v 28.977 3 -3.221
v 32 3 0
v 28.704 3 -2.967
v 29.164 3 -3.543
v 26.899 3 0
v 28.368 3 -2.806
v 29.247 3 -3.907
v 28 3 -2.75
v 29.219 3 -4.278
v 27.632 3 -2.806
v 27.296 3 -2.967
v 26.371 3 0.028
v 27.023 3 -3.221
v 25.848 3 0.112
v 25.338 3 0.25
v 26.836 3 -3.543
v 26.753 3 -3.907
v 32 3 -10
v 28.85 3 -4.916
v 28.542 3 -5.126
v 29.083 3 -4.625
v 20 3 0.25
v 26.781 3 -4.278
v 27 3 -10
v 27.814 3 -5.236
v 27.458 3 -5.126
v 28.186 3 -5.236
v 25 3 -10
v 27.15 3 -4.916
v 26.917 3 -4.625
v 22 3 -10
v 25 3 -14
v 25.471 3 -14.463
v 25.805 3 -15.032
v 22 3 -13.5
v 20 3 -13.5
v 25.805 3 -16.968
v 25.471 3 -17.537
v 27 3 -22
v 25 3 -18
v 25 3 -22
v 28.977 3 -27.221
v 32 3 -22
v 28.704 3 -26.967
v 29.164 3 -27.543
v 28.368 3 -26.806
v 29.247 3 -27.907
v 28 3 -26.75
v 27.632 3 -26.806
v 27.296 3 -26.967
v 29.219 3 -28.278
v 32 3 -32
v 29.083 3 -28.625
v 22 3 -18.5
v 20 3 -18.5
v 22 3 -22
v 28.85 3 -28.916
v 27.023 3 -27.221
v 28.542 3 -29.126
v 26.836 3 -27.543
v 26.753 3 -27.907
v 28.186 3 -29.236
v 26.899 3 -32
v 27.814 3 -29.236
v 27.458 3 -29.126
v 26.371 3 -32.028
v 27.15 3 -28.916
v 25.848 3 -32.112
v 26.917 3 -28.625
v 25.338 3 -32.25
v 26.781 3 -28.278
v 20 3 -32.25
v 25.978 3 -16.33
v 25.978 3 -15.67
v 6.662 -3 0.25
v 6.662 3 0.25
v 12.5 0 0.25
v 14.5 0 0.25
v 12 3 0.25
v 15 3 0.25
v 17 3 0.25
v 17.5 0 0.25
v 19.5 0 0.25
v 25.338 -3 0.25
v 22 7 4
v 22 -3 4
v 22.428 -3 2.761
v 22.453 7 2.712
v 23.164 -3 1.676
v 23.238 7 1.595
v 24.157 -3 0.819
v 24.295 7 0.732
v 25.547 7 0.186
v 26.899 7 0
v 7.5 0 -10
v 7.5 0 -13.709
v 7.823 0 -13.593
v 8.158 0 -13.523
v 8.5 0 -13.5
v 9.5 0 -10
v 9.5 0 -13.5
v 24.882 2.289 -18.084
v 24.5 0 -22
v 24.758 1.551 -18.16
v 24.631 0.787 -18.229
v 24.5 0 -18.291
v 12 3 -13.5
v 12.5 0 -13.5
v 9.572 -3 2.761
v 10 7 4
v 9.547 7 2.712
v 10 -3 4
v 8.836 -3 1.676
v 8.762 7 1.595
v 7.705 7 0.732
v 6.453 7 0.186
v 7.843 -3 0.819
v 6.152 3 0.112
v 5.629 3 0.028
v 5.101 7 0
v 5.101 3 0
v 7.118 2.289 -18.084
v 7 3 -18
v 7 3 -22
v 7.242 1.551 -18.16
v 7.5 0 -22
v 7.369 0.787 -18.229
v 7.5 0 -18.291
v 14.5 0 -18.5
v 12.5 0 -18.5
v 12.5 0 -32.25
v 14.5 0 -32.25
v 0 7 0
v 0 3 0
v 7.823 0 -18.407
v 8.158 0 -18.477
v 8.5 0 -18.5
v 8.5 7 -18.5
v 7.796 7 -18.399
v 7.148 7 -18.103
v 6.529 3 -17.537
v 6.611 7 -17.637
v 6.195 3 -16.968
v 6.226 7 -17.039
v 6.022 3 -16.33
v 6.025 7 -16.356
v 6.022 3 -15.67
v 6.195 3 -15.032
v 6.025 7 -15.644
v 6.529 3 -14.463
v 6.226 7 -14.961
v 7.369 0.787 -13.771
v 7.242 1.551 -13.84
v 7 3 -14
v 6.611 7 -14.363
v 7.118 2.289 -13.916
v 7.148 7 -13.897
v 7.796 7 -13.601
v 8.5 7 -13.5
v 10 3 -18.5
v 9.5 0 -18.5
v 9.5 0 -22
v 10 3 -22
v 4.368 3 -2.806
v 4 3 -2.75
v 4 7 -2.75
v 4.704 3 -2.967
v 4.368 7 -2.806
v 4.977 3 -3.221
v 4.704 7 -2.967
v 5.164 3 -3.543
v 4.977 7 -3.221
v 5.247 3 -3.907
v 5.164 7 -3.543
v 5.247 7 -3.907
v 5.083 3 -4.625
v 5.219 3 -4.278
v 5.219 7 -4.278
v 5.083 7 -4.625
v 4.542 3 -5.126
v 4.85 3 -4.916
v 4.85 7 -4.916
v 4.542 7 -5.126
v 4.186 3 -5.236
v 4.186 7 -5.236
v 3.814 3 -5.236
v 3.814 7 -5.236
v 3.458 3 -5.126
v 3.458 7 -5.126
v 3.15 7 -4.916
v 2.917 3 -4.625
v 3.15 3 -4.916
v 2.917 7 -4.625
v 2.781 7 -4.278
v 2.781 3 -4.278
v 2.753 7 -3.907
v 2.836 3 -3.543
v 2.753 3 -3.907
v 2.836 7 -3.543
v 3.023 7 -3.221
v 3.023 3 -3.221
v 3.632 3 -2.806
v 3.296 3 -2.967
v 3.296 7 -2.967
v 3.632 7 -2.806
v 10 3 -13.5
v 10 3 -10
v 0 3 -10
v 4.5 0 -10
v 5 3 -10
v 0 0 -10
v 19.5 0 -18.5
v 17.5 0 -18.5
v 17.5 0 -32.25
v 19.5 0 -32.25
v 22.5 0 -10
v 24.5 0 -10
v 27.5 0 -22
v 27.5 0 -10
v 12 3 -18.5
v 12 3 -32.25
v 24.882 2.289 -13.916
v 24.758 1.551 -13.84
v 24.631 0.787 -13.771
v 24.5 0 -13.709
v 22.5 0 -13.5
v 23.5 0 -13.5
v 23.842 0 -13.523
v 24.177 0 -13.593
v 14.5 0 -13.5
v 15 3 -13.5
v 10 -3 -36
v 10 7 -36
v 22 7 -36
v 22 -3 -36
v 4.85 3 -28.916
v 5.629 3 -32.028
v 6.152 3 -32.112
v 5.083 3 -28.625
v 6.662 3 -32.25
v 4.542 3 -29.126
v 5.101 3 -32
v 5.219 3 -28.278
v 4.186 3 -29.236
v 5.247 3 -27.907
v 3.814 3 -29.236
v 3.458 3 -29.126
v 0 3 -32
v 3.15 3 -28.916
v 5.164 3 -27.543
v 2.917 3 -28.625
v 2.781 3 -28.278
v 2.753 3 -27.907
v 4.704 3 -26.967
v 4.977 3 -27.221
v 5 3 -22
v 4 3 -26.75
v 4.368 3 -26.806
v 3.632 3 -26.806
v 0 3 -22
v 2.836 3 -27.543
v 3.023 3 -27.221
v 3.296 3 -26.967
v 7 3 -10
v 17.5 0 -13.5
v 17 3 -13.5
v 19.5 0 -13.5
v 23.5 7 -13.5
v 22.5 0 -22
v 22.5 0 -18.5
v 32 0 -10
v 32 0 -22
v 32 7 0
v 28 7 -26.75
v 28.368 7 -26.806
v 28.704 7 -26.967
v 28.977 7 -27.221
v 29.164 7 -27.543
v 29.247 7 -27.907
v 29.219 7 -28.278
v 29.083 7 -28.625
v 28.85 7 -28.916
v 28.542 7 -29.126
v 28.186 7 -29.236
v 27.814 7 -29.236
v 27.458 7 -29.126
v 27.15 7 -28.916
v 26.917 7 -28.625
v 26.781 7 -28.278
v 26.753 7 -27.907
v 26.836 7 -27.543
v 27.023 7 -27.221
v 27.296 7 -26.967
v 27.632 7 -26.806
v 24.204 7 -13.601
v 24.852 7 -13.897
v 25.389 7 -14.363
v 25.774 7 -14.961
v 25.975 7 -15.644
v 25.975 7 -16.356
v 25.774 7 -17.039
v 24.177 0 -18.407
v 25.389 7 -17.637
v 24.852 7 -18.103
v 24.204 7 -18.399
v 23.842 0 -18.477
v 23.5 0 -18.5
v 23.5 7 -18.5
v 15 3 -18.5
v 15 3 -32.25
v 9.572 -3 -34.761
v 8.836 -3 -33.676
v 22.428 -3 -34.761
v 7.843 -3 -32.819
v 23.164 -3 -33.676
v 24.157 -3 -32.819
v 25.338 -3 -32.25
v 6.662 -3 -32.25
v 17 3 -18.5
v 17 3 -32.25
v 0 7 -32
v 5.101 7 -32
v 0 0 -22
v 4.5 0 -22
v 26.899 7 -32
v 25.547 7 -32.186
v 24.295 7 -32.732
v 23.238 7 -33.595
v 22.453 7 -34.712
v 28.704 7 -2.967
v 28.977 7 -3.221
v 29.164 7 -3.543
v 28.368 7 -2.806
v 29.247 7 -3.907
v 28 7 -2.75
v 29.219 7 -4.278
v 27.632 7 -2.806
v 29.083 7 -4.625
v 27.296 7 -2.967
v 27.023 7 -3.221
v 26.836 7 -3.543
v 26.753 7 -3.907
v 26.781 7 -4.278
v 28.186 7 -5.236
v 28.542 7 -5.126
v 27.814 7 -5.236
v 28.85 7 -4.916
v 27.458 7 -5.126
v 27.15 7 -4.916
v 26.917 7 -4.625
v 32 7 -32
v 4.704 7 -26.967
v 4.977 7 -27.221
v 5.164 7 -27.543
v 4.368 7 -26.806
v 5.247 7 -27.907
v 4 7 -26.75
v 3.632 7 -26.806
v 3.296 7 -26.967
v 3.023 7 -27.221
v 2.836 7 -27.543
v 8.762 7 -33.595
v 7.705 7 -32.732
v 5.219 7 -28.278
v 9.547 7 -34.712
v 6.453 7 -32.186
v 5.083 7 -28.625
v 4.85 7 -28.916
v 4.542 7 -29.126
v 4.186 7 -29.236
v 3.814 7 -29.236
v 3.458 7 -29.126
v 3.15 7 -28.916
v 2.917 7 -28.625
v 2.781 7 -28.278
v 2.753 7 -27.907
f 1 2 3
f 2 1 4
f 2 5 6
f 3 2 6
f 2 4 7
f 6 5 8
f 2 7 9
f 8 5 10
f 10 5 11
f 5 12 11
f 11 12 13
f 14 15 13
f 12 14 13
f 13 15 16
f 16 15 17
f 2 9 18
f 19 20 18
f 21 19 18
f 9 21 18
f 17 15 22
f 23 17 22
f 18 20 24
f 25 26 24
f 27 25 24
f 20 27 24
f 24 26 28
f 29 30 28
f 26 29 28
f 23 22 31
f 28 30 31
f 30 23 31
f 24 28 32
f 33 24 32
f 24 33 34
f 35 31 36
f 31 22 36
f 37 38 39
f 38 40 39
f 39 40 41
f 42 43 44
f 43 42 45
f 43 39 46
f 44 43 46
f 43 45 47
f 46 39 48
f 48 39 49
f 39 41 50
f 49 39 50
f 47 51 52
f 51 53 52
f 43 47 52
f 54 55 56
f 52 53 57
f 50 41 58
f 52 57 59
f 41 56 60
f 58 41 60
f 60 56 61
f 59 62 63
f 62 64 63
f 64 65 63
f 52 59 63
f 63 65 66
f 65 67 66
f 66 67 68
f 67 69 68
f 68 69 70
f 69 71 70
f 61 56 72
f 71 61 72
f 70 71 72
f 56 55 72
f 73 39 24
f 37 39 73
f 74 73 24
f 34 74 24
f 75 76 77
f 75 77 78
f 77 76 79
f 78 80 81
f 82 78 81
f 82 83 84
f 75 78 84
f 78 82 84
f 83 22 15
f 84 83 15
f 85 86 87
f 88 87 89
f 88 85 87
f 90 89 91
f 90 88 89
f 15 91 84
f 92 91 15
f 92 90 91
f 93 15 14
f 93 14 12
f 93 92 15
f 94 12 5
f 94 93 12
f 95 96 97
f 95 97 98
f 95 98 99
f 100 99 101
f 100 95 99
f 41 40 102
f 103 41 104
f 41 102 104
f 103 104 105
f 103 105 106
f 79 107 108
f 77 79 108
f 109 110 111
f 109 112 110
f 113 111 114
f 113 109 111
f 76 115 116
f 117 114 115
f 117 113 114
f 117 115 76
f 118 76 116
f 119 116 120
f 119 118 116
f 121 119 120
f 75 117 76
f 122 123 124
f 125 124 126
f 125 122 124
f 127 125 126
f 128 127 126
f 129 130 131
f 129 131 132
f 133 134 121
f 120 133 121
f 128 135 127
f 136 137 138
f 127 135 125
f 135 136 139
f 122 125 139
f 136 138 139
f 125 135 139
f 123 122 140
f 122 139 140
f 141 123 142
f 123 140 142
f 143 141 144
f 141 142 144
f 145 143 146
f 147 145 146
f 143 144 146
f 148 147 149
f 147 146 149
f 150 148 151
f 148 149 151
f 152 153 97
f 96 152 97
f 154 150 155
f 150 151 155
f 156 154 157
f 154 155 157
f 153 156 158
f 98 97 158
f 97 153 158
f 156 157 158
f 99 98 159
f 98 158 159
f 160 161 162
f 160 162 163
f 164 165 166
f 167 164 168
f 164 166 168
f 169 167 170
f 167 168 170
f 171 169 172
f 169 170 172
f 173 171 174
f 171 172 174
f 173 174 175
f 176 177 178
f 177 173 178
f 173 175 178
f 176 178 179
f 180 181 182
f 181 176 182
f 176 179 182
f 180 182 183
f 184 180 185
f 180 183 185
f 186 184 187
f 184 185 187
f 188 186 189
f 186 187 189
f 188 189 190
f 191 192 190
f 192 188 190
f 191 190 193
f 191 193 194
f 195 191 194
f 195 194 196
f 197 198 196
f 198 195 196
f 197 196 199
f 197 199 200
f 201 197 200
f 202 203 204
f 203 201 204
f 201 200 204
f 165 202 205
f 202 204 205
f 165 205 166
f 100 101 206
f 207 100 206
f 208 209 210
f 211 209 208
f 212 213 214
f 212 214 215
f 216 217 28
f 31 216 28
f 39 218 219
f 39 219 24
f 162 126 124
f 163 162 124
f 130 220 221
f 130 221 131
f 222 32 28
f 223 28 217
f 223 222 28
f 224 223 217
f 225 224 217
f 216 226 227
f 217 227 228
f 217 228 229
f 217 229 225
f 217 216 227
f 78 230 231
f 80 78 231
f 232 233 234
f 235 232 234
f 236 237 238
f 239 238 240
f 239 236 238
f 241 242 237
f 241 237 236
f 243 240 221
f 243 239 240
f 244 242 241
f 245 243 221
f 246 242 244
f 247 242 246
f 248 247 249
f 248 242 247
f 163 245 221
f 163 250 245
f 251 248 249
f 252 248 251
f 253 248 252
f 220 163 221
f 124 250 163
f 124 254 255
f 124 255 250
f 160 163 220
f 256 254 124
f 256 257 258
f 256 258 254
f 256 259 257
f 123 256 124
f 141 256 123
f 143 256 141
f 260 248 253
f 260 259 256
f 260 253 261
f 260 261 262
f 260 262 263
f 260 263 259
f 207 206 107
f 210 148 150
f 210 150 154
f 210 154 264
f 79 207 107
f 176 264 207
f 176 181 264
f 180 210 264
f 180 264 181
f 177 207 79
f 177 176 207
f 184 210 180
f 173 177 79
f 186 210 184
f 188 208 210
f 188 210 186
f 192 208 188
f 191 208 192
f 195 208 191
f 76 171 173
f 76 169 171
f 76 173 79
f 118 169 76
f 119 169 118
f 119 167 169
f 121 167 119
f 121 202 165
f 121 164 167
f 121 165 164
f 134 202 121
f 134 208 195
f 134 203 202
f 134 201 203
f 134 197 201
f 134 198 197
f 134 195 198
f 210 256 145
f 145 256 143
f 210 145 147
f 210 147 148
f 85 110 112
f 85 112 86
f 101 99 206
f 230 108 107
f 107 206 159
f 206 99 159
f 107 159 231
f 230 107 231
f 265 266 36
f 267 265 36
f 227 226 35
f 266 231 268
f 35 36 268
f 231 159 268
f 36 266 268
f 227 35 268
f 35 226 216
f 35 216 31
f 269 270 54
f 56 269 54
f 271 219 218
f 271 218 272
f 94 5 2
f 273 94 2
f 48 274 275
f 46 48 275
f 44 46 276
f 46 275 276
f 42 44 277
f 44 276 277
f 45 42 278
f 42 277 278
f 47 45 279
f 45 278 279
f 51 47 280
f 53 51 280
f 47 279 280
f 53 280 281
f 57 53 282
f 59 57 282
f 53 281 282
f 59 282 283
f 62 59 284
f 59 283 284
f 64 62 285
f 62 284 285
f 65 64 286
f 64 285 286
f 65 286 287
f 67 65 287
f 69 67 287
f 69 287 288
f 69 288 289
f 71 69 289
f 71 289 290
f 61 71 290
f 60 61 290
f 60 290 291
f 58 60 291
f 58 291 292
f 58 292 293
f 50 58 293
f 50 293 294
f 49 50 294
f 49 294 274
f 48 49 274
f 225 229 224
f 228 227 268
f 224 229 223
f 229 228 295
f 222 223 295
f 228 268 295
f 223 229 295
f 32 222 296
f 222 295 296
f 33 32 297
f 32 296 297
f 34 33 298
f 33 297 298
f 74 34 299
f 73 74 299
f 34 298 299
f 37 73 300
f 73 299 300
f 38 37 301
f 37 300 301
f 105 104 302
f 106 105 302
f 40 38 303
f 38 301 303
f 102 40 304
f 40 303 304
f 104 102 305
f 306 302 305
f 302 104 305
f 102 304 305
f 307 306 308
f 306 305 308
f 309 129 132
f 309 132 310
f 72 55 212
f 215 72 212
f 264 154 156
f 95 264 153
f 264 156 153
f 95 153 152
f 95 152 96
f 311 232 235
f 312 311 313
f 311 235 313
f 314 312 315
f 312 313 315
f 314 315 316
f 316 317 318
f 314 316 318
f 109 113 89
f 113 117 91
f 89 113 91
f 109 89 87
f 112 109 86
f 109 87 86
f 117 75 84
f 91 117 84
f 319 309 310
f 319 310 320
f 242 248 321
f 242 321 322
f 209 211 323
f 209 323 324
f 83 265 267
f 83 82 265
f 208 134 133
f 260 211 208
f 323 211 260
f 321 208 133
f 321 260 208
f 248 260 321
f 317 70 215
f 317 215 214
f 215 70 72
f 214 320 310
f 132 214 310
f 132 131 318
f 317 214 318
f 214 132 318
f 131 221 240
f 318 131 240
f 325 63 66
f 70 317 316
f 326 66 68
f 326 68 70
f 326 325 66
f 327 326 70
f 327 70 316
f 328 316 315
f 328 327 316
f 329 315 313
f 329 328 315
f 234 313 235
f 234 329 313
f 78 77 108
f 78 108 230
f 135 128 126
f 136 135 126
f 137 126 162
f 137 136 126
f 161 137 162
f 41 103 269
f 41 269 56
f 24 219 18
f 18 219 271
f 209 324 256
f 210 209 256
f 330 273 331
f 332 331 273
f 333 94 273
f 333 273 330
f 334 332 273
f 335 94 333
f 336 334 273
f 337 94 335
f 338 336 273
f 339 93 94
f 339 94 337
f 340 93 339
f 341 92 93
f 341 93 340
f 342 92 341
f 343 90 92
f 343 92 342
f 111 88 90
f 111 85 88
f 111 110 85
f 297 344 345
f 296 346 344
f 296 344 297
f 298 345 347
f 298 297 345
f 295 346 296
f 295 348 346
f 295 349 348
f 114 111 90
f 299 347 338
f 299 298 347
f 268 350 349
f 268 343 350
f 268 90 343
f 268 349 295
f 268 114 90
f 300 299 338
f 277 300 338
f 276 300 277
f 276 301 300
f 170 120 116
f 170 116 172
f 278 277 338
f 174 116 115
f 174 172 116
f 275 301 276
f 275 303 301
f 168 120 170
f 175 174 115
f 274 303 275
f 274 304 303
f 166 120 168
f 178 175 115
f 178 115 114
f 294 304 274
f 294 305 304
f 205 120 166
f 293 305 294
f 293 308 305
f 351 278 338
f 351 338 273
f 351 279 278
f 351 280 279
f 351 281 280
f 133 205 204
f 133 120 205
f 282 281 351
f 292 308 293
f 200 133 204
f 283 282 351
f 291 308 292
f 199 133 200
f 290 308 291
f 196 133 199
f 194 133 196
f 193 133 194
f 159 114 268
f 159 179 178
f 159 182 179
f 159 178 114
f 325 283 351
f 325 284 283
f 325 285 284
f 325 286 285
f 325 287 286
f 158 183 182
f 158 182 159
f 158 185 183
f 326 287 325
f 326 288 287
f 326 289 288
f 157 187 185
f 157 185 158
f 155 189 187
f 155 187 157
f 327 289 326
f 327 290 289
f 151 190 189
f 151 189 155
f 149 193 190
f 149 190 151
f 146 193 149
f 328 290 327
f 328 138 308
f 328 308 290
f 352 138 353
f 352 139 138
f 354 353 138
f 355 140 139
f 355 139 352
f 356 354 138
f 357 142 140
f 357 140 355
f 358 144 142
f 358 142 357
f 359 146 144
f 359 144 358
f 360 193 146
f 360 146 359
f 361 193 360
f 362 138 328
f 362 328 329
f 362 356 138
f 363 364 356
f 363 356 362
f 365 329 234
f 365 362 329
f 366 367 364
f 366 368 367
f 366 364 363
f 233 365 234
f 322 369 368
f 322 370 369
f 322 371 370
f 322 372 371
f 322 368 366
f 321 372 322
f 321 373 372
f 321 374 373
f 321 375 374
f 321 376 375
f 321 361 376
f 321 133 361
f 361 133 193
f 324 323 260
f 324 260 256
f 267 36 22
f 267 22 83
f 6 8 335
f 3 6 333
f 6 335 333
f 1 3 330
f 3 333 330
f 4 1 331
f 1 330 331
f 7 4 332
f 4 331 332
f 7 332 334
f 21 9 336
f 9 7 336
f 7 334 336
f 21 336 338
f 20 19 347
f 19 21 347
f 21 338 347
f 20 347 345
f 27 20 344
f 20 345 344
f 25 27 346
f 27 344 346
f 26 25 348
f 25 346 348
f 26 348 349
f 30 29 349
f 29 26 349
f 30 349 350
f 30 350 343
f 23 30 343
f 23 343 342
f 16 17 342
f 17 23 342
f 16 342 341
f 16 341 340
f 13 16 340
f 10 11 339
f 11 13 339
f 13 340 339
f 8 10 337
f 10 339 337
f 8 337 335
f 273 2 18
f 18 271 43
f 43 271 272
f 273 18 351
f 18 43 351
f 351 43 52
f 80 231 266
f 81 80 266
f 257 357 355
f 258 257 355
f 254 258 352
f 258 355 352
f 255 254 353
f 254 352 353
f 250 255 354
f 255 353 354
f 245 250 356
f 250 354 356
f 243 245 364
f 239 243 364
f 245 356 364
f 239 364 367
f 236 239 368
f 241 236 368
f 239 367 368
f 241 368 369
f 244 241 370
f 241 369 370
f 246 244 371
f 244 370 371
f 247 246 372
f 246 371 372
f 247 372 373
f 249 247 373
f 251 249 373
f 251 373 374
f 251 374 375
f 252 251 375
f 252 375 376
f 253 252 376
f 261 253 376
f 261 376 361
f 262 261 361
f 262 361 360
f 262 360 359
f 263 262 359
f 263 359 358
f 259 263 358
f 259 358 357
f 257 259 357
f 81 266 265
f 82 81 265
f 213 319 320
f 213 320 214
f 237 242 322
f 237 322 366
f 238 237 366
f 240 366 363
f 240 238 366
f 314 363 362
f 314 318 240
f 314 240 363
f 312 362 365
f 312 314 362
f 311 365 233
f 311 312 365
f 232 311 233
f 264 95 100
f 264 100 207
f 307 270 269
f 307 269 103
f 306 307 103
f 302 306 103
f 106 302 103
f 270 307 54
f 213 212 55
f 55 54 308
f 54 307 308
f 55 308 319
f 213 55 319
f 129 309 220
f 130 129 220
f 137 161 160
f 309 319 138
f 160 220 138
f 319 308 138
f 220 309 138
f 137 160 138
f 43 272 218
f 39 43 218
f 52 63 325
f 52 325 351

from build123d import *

# Parameters (mm, degrees)
SKETCH_1_W                      = 32
SKETCH_1_H                      = 32
EXTRUDE_1_DEPTH                 = 7
SKETCH_3_R                      = 1.25
CUT_EXTRUDE_1_DEPTH             = 46.793012567
CUT_EXTRUDE_2_DEPTH             = 3
CUT_EXTRUDE_3_DEPTH             = 46.793012567
SKETCH_6_W                      = 12
SKETCH_6_H                      = 10
EXTRUDE_2_DEPTH                 = 4
SKETCH_11_W                     = 12
SKETCH_11_H                     = 3
CUT_EXTRUDE_5_DEPTH             = 0.25
SKETCH_12_W                     = 12
SKETCH_12_H                     = 3
CUT_EXTRUDE_6_DEPTH             = 0.25
CUT_EXTRUDE_7_REACH             = 40.38
CUT_EXTRUDE_7_DIRECTION_2_REACH = 40.38
FILLET_1_R                      = 5
FILLET_2_R                      = 5
CUT_EXTRUDE_8_REACH             = 50.672
SKETCH_13_W                     = 10
SKETCH_13_H                     = 3
CUT_EXTRUDE_9_REACH             = 50.672
SKETCH_14_W                     = 10
SKETCH_14_H                     = 3


with BuildPart() as part:
    # Эскиз1 → Бобышка-Вытянуть1 (new body)
    with BuildSketch(Plane(origin=(0, 0, 0), x_dir=(1, 0, 0), z_dir=(0, 1, 0))):
        with Locations((16, 16)):
            Rectangle(SKETCH_1_W, SKETCH_1_H)
    extrude(amount=EXTRUDE_1_DEPTH)

    # Эскиз3 → Вырез-Вытянуть1 (cut, through all)
    with BuildSketch(Plane(origin=(0, 7, 0), x_dir=(1, 0, 0), z_dir=(0, 1, 0))):
        with Locations(Location((4, 28, 0), (0, 0, 270))):
            Circle(SKETCH_3_R)
        with Locations(Location((28, 28, 0), (0, 0, 270))):
            Circle(SKETCH_3_R)
        with Locations(Location((4, 4, 0), (0, 0, 270))):
            Circle(SKETCH_3_R)
        with Locations(Location((28, 4, 0), (0, 0, 270))):
            Circle(SKETCH_3_R)
    extrude(amount=-CUT_EXTRUDE_1_DEPTH, mode=Mode.SUBTRACT)

    # Эскиз4 → Вырез-Вытянуть2 (cut)
    with BuildSketch(Plane.XZ):
        with BuildLine():
            Line((28, -10), (32, -10))
            Line((32, -10), (32, 0))
            Line((32, 0), (22, 0))
            Line((22, 0), (22, -4))
            ThreePointArc((22, -4), (23.757359313, -8.242640687), (28, -10))
        make_face()
        with BuildLine():
            Line((4, -10), (0, -10))
            Line((0, -10), (0, 0))
            Line((0, 0), (10, 0))
            Line((10, 0), (10, -4))
            ThreePointArc((10, -4), (8.242640687, -8.242640687), (4, -10))
        make_face()
        with BuildLine():
            Line((22, -32), (32, -32))
            Line((32, -32), (32, -22))
            Line((32, -22), (28, -22))
            ThreePointArc((28, -22), (23.757359313, -23.757359313), (22, -28))
            Line((22, -28), (22, -32))
        make_face()
        with BuildLine():
            Line((10, -32), (0, -32))
            Line((0, -32), (0, -22))
            Line((0, -22), (4, -22))
            ThreePointArc((4, -22), (8.242640687, -23.757359313), (10, -28))
            Line((10, -28), (10, -32))
        make_face()
    extrude(amount=-CUT_EXTRUDE_2_DEPTH, mode=Mode.SUBTRACT)

    # Эскиз5 → Вырез-Вытянуть3 (cut, through all)
    with BuildSketch(Plane(origin=(0, 7, 0), x_dir=(1, 0, 0), z_dir=(0, 1, 0))):
        with BuildLine():
            Line((23.5, 18.5), (8.5, 18.5))
            ThreePointArc((8.5, 18.5), (6, 16), (8.5, 13.5))
            Line((8.5, 13.5), (23.5, 13.5))
            ThreePointArc((23.5, 13.5), (26, 16), (23.5, 18.5))
        make_face()
    extrude(amount=-CUT_EXTRUDE_3_DEPTH, mode=Mode.SUBTRACT)

    # Эскиз6 → Бобышка-Вытянуть2 (add)
    with BuildSketch(Plane.XY):
        with Locations((16, 2)):
            Rectangle(SKETCH_6_W, SKETCH_6_H)
    extrude_2 = extrude(amount=EXTRUDE_2_DEPTH)

    # Зеркальное отражение1: Бобышка-Вытянуть2 across plane
    add(extrude_2.mirror(Plane(origin=(0, 0, -16), x_dir=(1, 0, 0), z_dir=(0, 0, -1))))

    # Эскиз11 → Вырез-Вытянуть5 (cut)
    with BuildSketch(Plane(origin=(0, 0, 0), x_dir=(-1, 0, 0), z_dir=(0, 0, -1))):
        with Locations((-16, -1.5)):
            Rectangle(SKETCH_11_W, SKETCH_11_H)
    extrude(amount=-CUT_EXTRUDE_5_DEPTH, mode=Mode.SUBTRACT)

    # Эскиз12 → Вырез-Вытянуть6 (cut)
    with BuildSketch(Plane.XY.offset(-32)):
        with Locations((16, -1.5)):
            Rectangle(SKETCH_12_W, SKETCH_12_H)
    extrude(amount=-CUT_EXTRUDE_6_DEPTH, mode=Mode.SUBTRACT)

    # Вырез-Вытянуть7: up to this face of the body (flat: up to its plane)
    cut_extrude_7_end = Plane(part.part.faces().sort_by_distance((16, -1.5, 0.25))[0])
    # Эскиз10 → Вырез-Вытянуть7 (cut, up to the picked face)
    with BuildSketch(Plane(origin=(0, 0, -16), x_dir=(-1, 0, 0), z_dir=(0, 0, -1)), mode=Mode.PRIVATE) as cut_extrude_7_sk1:
        Polygon((-14.5, 0), (-15, 3), (-17, 3), (-17.5, 0), align=None)
    cut_extrude_7_tool1 = split(extrude(cut_extrude_7_sk1.sketch, amount=-CUT_EXTRUDE_7_REACH, mode=Mode.PRIVATE), bisect_by=cut_extrude_7_end, keep=Keep.BOTH, mode=Mode.PRIVATE)
    # Эскиз10 → Вырез-Вытянуть7 (cut, up to the picked face)
    with BuildSketch(Plane(origin=(0, 0, -16), x_dir=(-1, 0, 0), z_dir=(0, 0, -1)), mode=Mode.PRIVATE) as cut_extrude_7_sk2:
        Polygon((-9.5, 0), (-10, 3), (-12, 3), (-12.5, 0), align=None)
    cut_extrude_7_tool2 = split(extrude(cut_extrude_7_sk2.sketch, amount=-CUT_EXTRUDE_7_REACH, mode=Mode.PRIVATE), bisect_by=cut_extrude_7_end, keep=Keep.BOTH, mode=Mode.PRIVATE)
    # Эскиз10 → Вырез-Вытянуть7 (cut, up to the picked face)
    with BuildSketch(Plane(origin=(0, 0, -16), x_dir=(-1, 0, 0), z_dir=(0, 0, -1)), mode=Mode.PRIVATE) as cut_extrude_7_sk3:
        Polygon((-4.5, 0), (-5, 3), (-7, 3), (-7.5, 0), align=None)
    cut_extrude_7_tool3 = split(extrude(cut_extrude_7_sk3.sketch, amount=-CUT_EXTRUDE_7_REACH, mode=Mode.PRIVATE), bisect_by=cut_extrude_7_end, keep=Keep.BOTH, mode=Mode.PRIVATE)
    # Эскиз10 → Вырез-Вытянуть7 (cut, up to the picked face)
    with BuildSketch(Plane(origin=(0, 0, -16), x_dir=(-1, 0, 0), z_dir=(0, 0, -1)), mode=Mode.PRIVATE) as cut_extrude_7_sk4:
        Polygon((-22.5, 0), (-22, 3), (-20, 3), (-19.5, 0), align=None)
    cut_extrude_7_tool4 = split(extrude(cut_extrude_7_sk4.sketch, amount=-CUT_EXTRUDE_7_REACH, mode=Mode.PRIVATE), bisect_by=cut_extrude_7_end, keep=Keep.BOTH, mode=Mode.PRIVATE)
    # Эскиз10 → Вырез-Вытянуть7 (cut, up to the picked face)
    with BuildSketch(Plane(origin=(0, 0, -16), x_dir=(-1, 0, 0), z_dir=(0, 0, -1)), mode=Mode.PRIVATE) as cut_extrude_7_sk5:
        Polygon((-27.5, 0), (-27, 3), (-25, 3), (-24.5, 0), align=None)
    cut_extrude_7_tool5 = split(extrude(cut_extrude_7_sk5.sketch, amount=-CUT_EXTRUDE_7_REACH, mode=Mode.PRIVATE), bisect_by=cut_extrude_7_end, keep=Keep.BOTH, mode=Mode.PRIVATE)
    add(cut_extrude_7_tool1.solids().sort_by(Axis((16, 1.4, -16), (0, 0, 1)))[0], mode=Mode.SUBTRACT)
    add(cut_extrude_7_tool2.solids().sort_by(Axis((11, 1.4, -16), (0, 0, 1)))[0], mode=Mode.SUBTRACT)
    add(cut_extrude_7_tool3.solids().sort_by(Axis((6, 1.4, -16), (0, 0, 1)))[0], mode=Mode.SUBTRACT)
    add(cut_extrude_7_tool4.solids().sort_by(Axis((21, 1.4, -16), (0, 0, 1)))[0], mode=Mode.SUBTRACT)
    add(cut_extrude_7_tool5.solids().sort_by(Axis((26, 1.4, -16), (0, 0, 1)))[0], mode=Mode.SUBTRACT)

    # Вырез-Вытянуть7 direction 2: up to this face of the body (flat: up to its plane)
    cut_extrude_7_direction_2_end = Plane(part.part.faces().sort_by_distance((16, -1.5, -32.25))[0])
    # Эскиз10 → Вырез-Вытянуть7 direction 2 (cut, up to the picked face)
    with BuildSketch(Plane(origin=(0, 0, -16), x_dir=(-1, 0, 0), z_dir=(0, 0, -1)), mode=Mode.PRIVATE) as cut_extrude_7_direction_2_sk1:
        Polygon((-14.5, 0), (-15, 3), (-17, 3), (-17.5, 0), align=None)
    cut_extrude_7_direction_2_tool1 = split(extrude(cut_extrude_7_direction_2_sk1.sketch, amount=CUT_EXTRUDE_7_DIRECTION_2_REACH, mode=Mode.PRIVATE), bisect_by=cut_extrude_7_direction_2_end, keep=Keep.BOTH, mode=Mode.PRIVATE)
    # Эскиз10 → Вырез-Вытянуть7 direction 2 (cut, up to the picked face)
    with BuildSketch(Plane(origin=(0, 0, -16), x_dir=(-1, 0, 0), z_dir=(0, 0, -1)), mode=Mode.PRIVATE) as cut_extrude_7_direction_2_sk2:
        Polygon((-9.5, 0), (-10, 3), (-12, 3), (-12.5, 0), align=None)
    cut_extrude_7_direction_2_tool2 = split(extrude(cut_extrude_7_direction_2_sk2.sketch, amount=CUT_EXTRUDE_7_DIRECTION_2_REACH, mode=Mode.PRIVATE), bisect_by=cut_extrude_7_direction_2_end, keep=Keep.BOTH, mode=Mode.PRIVATE)
    # Эскиз10 → Вырез-Вытянуть7 direction 2 (cut, up to the picked face)
    with BuildSketch(Plane(origin=(0, 0, -16), x_dir=(-1, 0, 0), z_dir=(0, 0, -1)), mode=Mode.PRIVATE) as cut_extrude_7_direction_2_sk3:
        Polygon((-4.5, 0), (-5, 3), (-7, 3), (-7.5, 0), align=None)
    cut_extrude_7_direction_2_tool3 = split(extrude(cut_extrude_7_direction_2_sk3.sketch, amount=CUT_EXTRUDE_7_DIRECTION_2_REACH, mode=Mode.PRIVATE), bisect_by=cut_extrude_7_direction_2_end, keep=Keep.BOTH, mode=Mode.PRIVATE)
    # Эскиз10 → Вырез-Вытянуть7 direction 2 (cut, up to the picked face)
    with BuildSketch(Plane(origin=(0, 0, -16), x_dir=(-1, 0, 0), z_dir=(0, 0, -1)), mode=Mode.PRIVATE) as cut_extrude_7_direction_2_sk4:
        Polygon((-22.5, 0), (-22, 3), (-20, 3), (-19.5, 0), align=None)
    cut_extrude_7_direction_2_tool4 = split(extrude(cut_extrude_7_direction_2_sk4.sketch, amount=CUT_EXTRUDE_7_DIRECTION_2_REACH, mode=Mode.PRIVATE), bisect_by=cut_extrude_7_direction_2_end, keep=Keep.BOTH, mode=Mode.PRIVATE)
    # Эскиз10 → Вырез-Вытянуть7 direction 2 (cut, up to the picked face)
    with BuildSketch(Plane(origin=(0, 0, -16), x_dir=(-1, 0, 0), z_dir=(0, 0, -1)), mode=Mode.PRIVATE) as cut_extrude_7_direction_2_sk5:
        Polygon((-27.5, 0), (-27, 3), (-25, 3), (-24.5, 0), align=None)
    cut_extrude_7_direction_2_tool5 = split(extrude(cut_extrude_7_direction_2_sk5.sketch, amount=CUT_EXTRUDE_7_DIRECTION_2_REACH, mode=Mode.PRIVATE), bisect_by=cut_extrude_7_direction_2_end, keep=Keep.BOTH, mode=Mode.PRIVATE)
    add(cut_extrude_7_direction_2_tool1.solids().sort_by(Axis((16, 1.4, -16), (0, 0, -1)))[0], mode=Mode.SUBTRACT)
    add(cut_extrude_7_direction_2_tool2.solids().sort_by(Axis((11, 1.4, -16), (0, 0, -1)))[0], mode=Mode.SUBTRACT)
    add(cut_extrude_7_direction_2_tool3.solids().sort_by(Axis((6, 1.4, -16), (0, 0, -1)))[0], mode=Mode.SUBTRACT)
    add(cut_extrude_7_direction_2_tool4.solids().sort_by(Axis((21, 1.4, -16), (0, 0, -1)))[0], mode=Mode.SUBTRACT)
    add(cut_extrude_7_direction_2_tool5.solids().sort_by(Axis((26, 1.4, -16), (0, 0, -1)))[0], mode=Mode.SUBTRACT)

    # Скругление1
    # the kernel refuses this fillet: 5 mm, written as the material it adds along each edge
    with BuildSketch(Plane(origin=(10, -9.247448714, 0), x_dir=(-1, 0, 0), z_dir=(0, 1, 0))) as fillet_1_piece_1_section:
        with BuildLine():
            CenterArc((4.898979486, 5), FILLET_1_R, 191.536959033, 78.463040967)
            Line((0, 4), (-0.09797959, 3.98))
            ThreePointArc((-0.09797959, 3.98), (-0.1, 2), (-0.1, 0))
            Line((-0.1, 0), (0, -0.1))
            Line((0, -0.1), (4.898979486, -0.1))
            Line((4.898979486, -0.1), (4.898979486, 0))
        make_face()
    fillet_1_piece_1 = extrude(amount=16.247448714, mode=Mode.PRIVATE)
    fillet_1_piece_1 = split(fillet_1_piece_1, bisect_by=Plane(origin=(9.174108799, 3, 1.317726135), z_dir=(0, -1, 0)), keep=Keep.TOP, mode=Mode.PRIVATE)
    fillet_1_piece_1 = split(fillet_1_piece_1, bisect_by=Plane(origin=(9.174108799, 0, 0.25), z_dir=(0, 0, 1)), keep=Keep.TOP, mode=Mode.PRIVATE)
    fillet_1_piece_1 = split(fillet_1_piece_1, bisect_by=Plane(origin=(9.174108799, -3, 1.317726135), z_dir=(0, 1, 0)), keep=Keep.TOP, mode=Mode.PRIVATE)
    add(fillet_1_piece_1)
    with BuildSketch(Plane(origin=(10, 3, 0), x_dir=(-1, 0, 0), z_dir=(0, 1, 0))) as fillet_1_piece_2_section:
        with BuildLine():
            CenterArc((4.898979486, 5), FILLET_1_R, 191.536959033, 78.463040967)
            Line((0, 4), (-0.09797959, 3.98))
            ThreePointArc((-0.09797959, 3.98), (-0.1, 2), (-0.1, 0))
            Line((-0.1, 0), (0, -0.1))
            Line((0, -0.1), (4.898979486, -0.1))
            Line((4.898979486, -0.1), (4.898979486, 0))
        make_face()
    fillet_1_piece_2 = extrude(amount=4, mode=Mode.PRIVATE)
    fillet_1_piece_2 = split(fillet_1_piece_2, bisect_by=Plane(origin=(7.929392112, 5, 0.25), z_dir=(0, 0, -1)), keep=Keep.TOP, mode=Mode.PRIVATE)
    add(fillet_1_piece_2)
    with BuildSketch(Plane(origin=(10, 3, 0), x_dir=(-1, 0, 0), z_dir=(0, 1, 0))) as fillet_1_piece_3_section:
        with BuildLine():
            CenterArc((4.898979486, 5), FILLET_1_R, 191.536959033, 78.463040967)
            Line((0, 4), (-0.09797959, 3.98))
            ThreePointArc((-0.09797959, 3.98), (-0.1, 2), (-0.1, 0))
            Line((-0.1, 0), (0, -0.1))
            Line((0, -0.1), (4.898979486, -0.1))
            Line((4.898979486, -0.1), (4.898979486, 0))
        make_face()
    fillet_1_piece_3 = extrude(amount=4, mode=Mode.PRIVATE)
    fillet_1_piece_3 = split(fillet_1_piece_3, bisect_by=Plane(origin=(9.174108799, 5, 0.25), z_dir=(0, 0, 1)), keep=Keep.TOP, mode=Mode.PRIVATE)
    add(fillet_1_piece_3)

    # Скругление2
    # the kernel refuses this fillet: 5 mm, written as the material it adds along each edge
    with BuildSketch(Plane(origin=(10, -9.247448714, -32), x_dir=(-1.5738521597081158e-12, 0, -1.0), z_dir=(0, 1, 0))) as fillet_2_piece_1_section:
        with BuildLine():
            CenterArc((5, 4.898979486), FILLET_2_R, 180, 78.463040967)
            Line((0, 4.898979486), (-0.1, 4.898979486))
            Line((-0.1, 4.898979486), (-0.1, 0))
            Line((-0.1, 0), (0, -0.1))
            ThreePointArc((0, -0.1), (2, -0.1), (3.98, -0.09797959))
            Line((3.98, -0.09797959), (4, 0))
        make_face()
    fillet_2_piece_1 = extrude(amount=16.247448714, mode=Mode.PRIVATE)
    fillet_2_piece_1 = split(fillet_2_piece_1, bisect_by=Plane(origin=(9.174108799, 0, -32.25), z_dir=(0, 0, -1)), keep=Keep.TOP, mode=Mode.PRIVATE)
    fillet_2_piece_1 = split(fillet_2_piece_1, bisect_by=Plane(origin=(9.174108799, 3, -33.317726135), z_dir=(0, -1, 0)), keep=Keep.TOP, mode=Mode.PRIVATE)
    fillet_2_piece_1 = split(fillet_2_piece_1, bisect_by=Plane(origin=(9.174108799, -3, -33.317726135), z_dir=(0, 1, 0)), keep=Keep.TOP, mode=Mode.PRIVATE)
    add(fillet_2_piece_1)
    with BuildSketch(Plane(origin=(10, 3, -32), x_dir=(-1.5720758028687162e-12, 0, -1.0), z_dir=(0, 1, 0))) as fillet_2_piece_2_section:
        with BuildLine():
            CenterArc((5, 4.898979486), FILLET_2_R, 180, 78.463040967)
            Line((0, 4.898979486), (-0.1, 4.898979486))
            Line((-0.1, 4.898979486), (-0.1, 0))
            Line((-0.1, 0), (0, -0.1))
            ThreePointArc((0, -0.1), (2, -0.1), (3.98, -0.09797959))
            Line((3.98, -0.09797959), (4, 0))
        make_face()
    fillet_2_piece_2 = extrude(amount=4, mode=Mode.PRIVATE)
    fillet_2_piece_2 = split(fillet_2_piece_2, bisect_by=Plane(origin=(9.174108799, 5, -32.25), z_dir=(0, 0, -1)), keep=Keep.TOP, mode=Mode.PRIVATE)
    add(fillet_2_piece_2)
    with BuildSketch(Plane(origin=(10, 3, -32), x_dir=(-1.5720758028687162e-12, 0, -1.0), z_dir=(0, 1, 0))) as fillet_2_piece_3_section:
        with BuildLine():
            CenterArc((5, 4.898979486), FILLET_2_R, 180, 78.463040967)
            Line((0, 4.898979486), (-0.1, 4.898979486))
            Line((-0.1, 4.898979486), (-0.1, 0))
            Line((-0.1, 0), (0, -0.1))
            ThreePointArc((0, -0.1), (2, -0.1), (3.98, -0.09797959))
            Line((3.98, -0.09797959), (4, 0))
        make_face()
    fillet_2_piece_3 = extrude(amount=4, mode=Mode.PRIVATE)
    fillet_2_piece_3 = split(fillet_2_piece_3, bisect_by=Plane(origin=(7.929392112, 5, -32.25), z_dir=(0, 0, 1)), keep=Keep.TOP, mode=Mode.PRIVATE)
    add(fillet_2_piece_3)
    with BuildSketch(Plane(origin=(22, 7, -32), x_dir=(1, 0, 0), z_dir=(0, -1, 0))) as fillet_2_piece_4_section:
        with BuildLine():
            CenterArc((4.898979486, -5), FILLET_2_R, 90, 78.463040967)
            Line((0, -4), (-0.09797959, -3.98))
            ThreePointArc((-0.09797959, -3.98), (-0.1, -2), (-0.1, 0))
            Line((-0.1, 0), (0, 0.1))
            Line((0, 0.1), (4.898979486, 0.1))
            Line((4.898979486, 0.1), (4.898979486, 0))
        make_face()
    fillet_2_piece_4 = extrude(amount=4, mode=Mode.PRIVATE)
    fillet_2_piece_4 = split(fillet_2_piece_4, bisect_by=Plane(origin=(24.070607888, 5, -32.25), z_dir=(0, 0, 1)), keep=Keep.TOP, mode=Mode.PRIVATE)
    add(fillet_2_piece_4)
    with BuildSketch(Plane(origin=(22, 7, -32), x_dir=(1, 0, 0), z_dir=(0, -1, 0))) as fillet_2_piece_5_section:
        with BuildLine():
            CenterArc((4.898979486, -5), FILLET_2_R, 90, 78.463040967)
            Line((0, -4), (-0.09797959, -3.98))
            ThreePointArc((-0.09797959, -3.98), (-0.1, -2), (-0.1, 0))
            Line((-0.1, 0), (0, 0.1))
            Line((0, 0.1), (4.898979486, 0.1))
            Line((4.898979486, 0.1), (4.898979486, 0))
        make_face()
    fillet_2_piece_5 = extrude(amount=4, mode=Mode.PRIVATE)
    fillet_2_piece_5 = split(fillet_2_piece_5, bisect_by=Plane(origin=(22.825891201, 5, -32.25), z_dir=(0, 0, -1)), keep=Keep.TOP, mode=Mode.PRIVATE)
    add(fillet_2_piece_5)
    with BuildSketch(Plane(origin=(22, 7, -32), x_dir=(1, 0, 0), z_dir=(0, -1, 0))) as fillet_2_piece_6_section:
        with BuildLine():
            CenterArc((4.898979486, -5), FILLET_2_R, 90, 78.463040967)
            Line((0, -4), (-0.09797959, -3.98))
            ThreePointArc((-0.09797959, -3.98), (-0.1, -2), (-0.1, 0))
            Line((-0.1, 0), (0, 0.1))
            Line((0, 0.1), (4.898979486, 0.1))
            Line((4.898979486, 0.1), (4.898979486, 0))
        make_face()
    fillet_2_piece_6 = extrude(amount=16.247448714, mode=Mode.PRIVATE)
    fillet_2_piece_6 = split(fillet_2_piece_6, bisect_by=Plane(origin=(22.825891201, 3, -33.317726135), z_dir=(0, -1, 0)), keep=Keep.TOP, mode=Mode.PRIVATE)
    fillet_2_piece_6 = split(fillet_2_piece_6, bisect_by=Plane(origin=(22.825891201, -3, -33.317726135), z_dir=(0, 1, 0)), keep=Keep.TOP, mode=Mode.PRIVATE)
    fillet_2_piece_6 = split(fillet_2_piece_6, bisect_by=Plane(origin=(22.825891201, 0, -32.25), z_dir=(0, 0, -1)), keep=Keep.TOP, mode=Mode.PRIVATE)
    add(fillet_2_piece_6)
    with BuildSketch(Plane(origin=(22, 7, 0), x_dir=(1.572075802868717e-12, 0, 1.0), z_dir=(0, -1, 0))) as fillet_2_piece_7_section:
        with BuildLine():
            CenterArc((5, -4.898979486), FILLET_2_R, 101.536959033, 78.463040967)
            Line((0, -4.898979486), (-0.1, -4.898979486))
            Line((-0.1, -4.898979486), (-0.1, 0))
            Line((-0.1, 0), (0, 0.1))
            ThreePointArc((0, 0.1), (2, 0.1), (3.98, 0.09797959))
            Line((3.98, 0.09797959), (4, 0))
        make_face()
    fillet_2_piece_7 = extrude(amount=4, mode=Mode.PRIVATE)
    fillet_2_piece_7 = split(fillet_2_piece_7, bisect_by=Plane(origin=(22.825891201, 5, 0.25), z_dir=(0, 0, 1)), keep=Keep.TOP, mode=Mode.PRIVATE)
    add(fillet_2_piece_7)
    with BuildSketch(Plane(origin=(22, 7, 0), x_dir=(1.572075802868717e-12, 0, 1.0), z_dir=(0, -1, 0))) as fillet_2_piece_8_section:
        with BuildLine():
            CenterArc((5, -4.898979486), FILLET_2_R, 101.536959033, 78.463040967)
            Line((0, -4.898979486), (-0.1, -4.898979486))
            Line((-0.1, -4.898979486), (-0.1, 0))
            Line((-0.1, 0), (0, 0.1))
            ThreePointArc((0, 0.1), (2, 0.1), (3.98, 0.09797959))
            Line((3.98, 0.09797959), (4, 0))
        make_face()
    fillet_2_piece_8 = extrude(amount=4, mode=Mode.PRIVATE)
    fillet_2_piece_8 = split(fillet_2_piece_8, bisect_by=Plane(origin=(24.070607888, 5, 0.25), z_dir=(0, 0, -1)), keep=Keep.TOP, mode=Mode.PRIVATE)
    add(fillet_2_piece_8)
    with BuildSketch(Plane(origin=(22, 7, 0), x_dir=(1.572075802868717e-12, 0, 1.0), z_dir=(0, -1, 0))) as fillet_2_piece_9_section:
        with BuildLine():
            CenterArc((5, -4.898979486), FILLET_2_R, 101.536959033, 78.463040967)
            Line((0, -4.898979486), (-0.1, -4.898979486))
            Line((-0.1, -4.898979486), (-0.1, 0))
            Line((-0.1, 0), (0, 0.1))
            ThreePointArc((0, 0.1), (2, 0.1), (3.98, 0.09797959))
            Line((3.98, 0.09797959), (4, 0))
        make_face()
    fillet_2_piece_9 = extrude(amount=16.247448714, mode=Mode.PRIVATE)
    fillet_2_piece_9 = split(fillet_2_piece_9, bisect_by=Plane(origin=(22.825891201, -3, 1.317726135), z_dir=(0, 1, 0)), keep=Keep.TOP, mode=Mode.PRIVATE)
    fillet_2_piece_9 = split(fillet_2_piece_9, bisect_by=Plane(origin=(22.825891201, 0, 0.25), z_dir=(0, 0, 1)), keep=Keep.TOP, mode=Mode.PRIVATE)
    fillet_2_piece_9 = split(fillet_2_piece_9, bisect_by=Plane(origin=(22.825891201, 3, 1.317726135), z_dir=(0, -1, 0)), keep=Keep.TOP, mode=Mode.PRIVATE)
    add(fillet_2_piece_9)

    # Вырез-Вытянуть8: up to this face of the body (flat: up to its plane)
    cut_extrude_8_end = Plane(part.part.faces().sort_by_distance((12.25, 1.5, -6.625))[0])
    # Эскиз13 → Вырез-Вытянуть8 (cut, up to the picked face)
    with BuildSketch(Plane.ZY, mode=Mode.PRIVATE) as cut_extrude_8_sk1:
        with Locations((-5, 1.5)):
            Rectangle(SKETCH_13_W, SKETCH_13_H)
    cut_extrude_8_tool1 = split(extrude(cut_extrude_8_sk1.sketch, amount=-CUT_EXTRUDE_8_REACH, mode=Mode.PRIVATE), bisect_by=cut_extrude_8_end, keep=Keep.BOTH, mode=Mode.PRIVATE)
    cut_extrude_8 = cut_extrude_8_tool1.solids().sort_by(Axis((0, 1.5, -5), (1, 0, 0)))[0]
    add(cut_extrude_8, mode=Mode.SUBTRACT)

    # Вырез-Вытянуть9: up to this plane
    cut_extrude_9_end = Plane(origin=(22.5, 0, 4.492640687), z_dir=(0.9863939238321437, 0.16439898730535746, 0))
    # Эскиз14 → Вырез-Вытянуть9 (cut, up to the surface)
    with BuildSketch(Plane(origin=(32, 0, 0), x_dir=(0, 0, -1), z_dir=(1, 0, 0)), mode=Mode.PRIVATE) as cut_extrude_9_sk1:
        with Locations((5, 1.5)):
            Rectangle(SKETCH_14_W, SKETCH_14_H)
    cut_extrude_9_tool1 = split(extrude(cut_extrude_9_sk1.sketch, amount=-CUT_EXTRUDE_9_REACH, mode=Mode.PRIVATE), bisect_by=cut_extrude_9_end, keep=Keep.BOTH, mode=Mode.PRIVATE)
    cut_extrude_9 = cut_extrude_9_tool1.solids().sort_by_distance((32, 1.5, -5))[0]
    add(cut_extrude_9, mode=Mode.SUBTRACT)

    # Зеркальное отражение2: Вырез-Вытянуть8, Вырез-Вытянуть9 across plane
    add(cut_extrude_8.mirror(Plane(origin=(0, 0, -16), x_dir=(1, 0, 0), z_dir=(0, 0, -1))), mode=Mode.SUBTRACT)
    add(cut_extrude_9.mirror(Plane(origin=(0, 0, -16), x_dir=(1, 0, 0), z_dir=(0, 0, -1))), mode=Mode.SUBTRACT)


solid = part.part
